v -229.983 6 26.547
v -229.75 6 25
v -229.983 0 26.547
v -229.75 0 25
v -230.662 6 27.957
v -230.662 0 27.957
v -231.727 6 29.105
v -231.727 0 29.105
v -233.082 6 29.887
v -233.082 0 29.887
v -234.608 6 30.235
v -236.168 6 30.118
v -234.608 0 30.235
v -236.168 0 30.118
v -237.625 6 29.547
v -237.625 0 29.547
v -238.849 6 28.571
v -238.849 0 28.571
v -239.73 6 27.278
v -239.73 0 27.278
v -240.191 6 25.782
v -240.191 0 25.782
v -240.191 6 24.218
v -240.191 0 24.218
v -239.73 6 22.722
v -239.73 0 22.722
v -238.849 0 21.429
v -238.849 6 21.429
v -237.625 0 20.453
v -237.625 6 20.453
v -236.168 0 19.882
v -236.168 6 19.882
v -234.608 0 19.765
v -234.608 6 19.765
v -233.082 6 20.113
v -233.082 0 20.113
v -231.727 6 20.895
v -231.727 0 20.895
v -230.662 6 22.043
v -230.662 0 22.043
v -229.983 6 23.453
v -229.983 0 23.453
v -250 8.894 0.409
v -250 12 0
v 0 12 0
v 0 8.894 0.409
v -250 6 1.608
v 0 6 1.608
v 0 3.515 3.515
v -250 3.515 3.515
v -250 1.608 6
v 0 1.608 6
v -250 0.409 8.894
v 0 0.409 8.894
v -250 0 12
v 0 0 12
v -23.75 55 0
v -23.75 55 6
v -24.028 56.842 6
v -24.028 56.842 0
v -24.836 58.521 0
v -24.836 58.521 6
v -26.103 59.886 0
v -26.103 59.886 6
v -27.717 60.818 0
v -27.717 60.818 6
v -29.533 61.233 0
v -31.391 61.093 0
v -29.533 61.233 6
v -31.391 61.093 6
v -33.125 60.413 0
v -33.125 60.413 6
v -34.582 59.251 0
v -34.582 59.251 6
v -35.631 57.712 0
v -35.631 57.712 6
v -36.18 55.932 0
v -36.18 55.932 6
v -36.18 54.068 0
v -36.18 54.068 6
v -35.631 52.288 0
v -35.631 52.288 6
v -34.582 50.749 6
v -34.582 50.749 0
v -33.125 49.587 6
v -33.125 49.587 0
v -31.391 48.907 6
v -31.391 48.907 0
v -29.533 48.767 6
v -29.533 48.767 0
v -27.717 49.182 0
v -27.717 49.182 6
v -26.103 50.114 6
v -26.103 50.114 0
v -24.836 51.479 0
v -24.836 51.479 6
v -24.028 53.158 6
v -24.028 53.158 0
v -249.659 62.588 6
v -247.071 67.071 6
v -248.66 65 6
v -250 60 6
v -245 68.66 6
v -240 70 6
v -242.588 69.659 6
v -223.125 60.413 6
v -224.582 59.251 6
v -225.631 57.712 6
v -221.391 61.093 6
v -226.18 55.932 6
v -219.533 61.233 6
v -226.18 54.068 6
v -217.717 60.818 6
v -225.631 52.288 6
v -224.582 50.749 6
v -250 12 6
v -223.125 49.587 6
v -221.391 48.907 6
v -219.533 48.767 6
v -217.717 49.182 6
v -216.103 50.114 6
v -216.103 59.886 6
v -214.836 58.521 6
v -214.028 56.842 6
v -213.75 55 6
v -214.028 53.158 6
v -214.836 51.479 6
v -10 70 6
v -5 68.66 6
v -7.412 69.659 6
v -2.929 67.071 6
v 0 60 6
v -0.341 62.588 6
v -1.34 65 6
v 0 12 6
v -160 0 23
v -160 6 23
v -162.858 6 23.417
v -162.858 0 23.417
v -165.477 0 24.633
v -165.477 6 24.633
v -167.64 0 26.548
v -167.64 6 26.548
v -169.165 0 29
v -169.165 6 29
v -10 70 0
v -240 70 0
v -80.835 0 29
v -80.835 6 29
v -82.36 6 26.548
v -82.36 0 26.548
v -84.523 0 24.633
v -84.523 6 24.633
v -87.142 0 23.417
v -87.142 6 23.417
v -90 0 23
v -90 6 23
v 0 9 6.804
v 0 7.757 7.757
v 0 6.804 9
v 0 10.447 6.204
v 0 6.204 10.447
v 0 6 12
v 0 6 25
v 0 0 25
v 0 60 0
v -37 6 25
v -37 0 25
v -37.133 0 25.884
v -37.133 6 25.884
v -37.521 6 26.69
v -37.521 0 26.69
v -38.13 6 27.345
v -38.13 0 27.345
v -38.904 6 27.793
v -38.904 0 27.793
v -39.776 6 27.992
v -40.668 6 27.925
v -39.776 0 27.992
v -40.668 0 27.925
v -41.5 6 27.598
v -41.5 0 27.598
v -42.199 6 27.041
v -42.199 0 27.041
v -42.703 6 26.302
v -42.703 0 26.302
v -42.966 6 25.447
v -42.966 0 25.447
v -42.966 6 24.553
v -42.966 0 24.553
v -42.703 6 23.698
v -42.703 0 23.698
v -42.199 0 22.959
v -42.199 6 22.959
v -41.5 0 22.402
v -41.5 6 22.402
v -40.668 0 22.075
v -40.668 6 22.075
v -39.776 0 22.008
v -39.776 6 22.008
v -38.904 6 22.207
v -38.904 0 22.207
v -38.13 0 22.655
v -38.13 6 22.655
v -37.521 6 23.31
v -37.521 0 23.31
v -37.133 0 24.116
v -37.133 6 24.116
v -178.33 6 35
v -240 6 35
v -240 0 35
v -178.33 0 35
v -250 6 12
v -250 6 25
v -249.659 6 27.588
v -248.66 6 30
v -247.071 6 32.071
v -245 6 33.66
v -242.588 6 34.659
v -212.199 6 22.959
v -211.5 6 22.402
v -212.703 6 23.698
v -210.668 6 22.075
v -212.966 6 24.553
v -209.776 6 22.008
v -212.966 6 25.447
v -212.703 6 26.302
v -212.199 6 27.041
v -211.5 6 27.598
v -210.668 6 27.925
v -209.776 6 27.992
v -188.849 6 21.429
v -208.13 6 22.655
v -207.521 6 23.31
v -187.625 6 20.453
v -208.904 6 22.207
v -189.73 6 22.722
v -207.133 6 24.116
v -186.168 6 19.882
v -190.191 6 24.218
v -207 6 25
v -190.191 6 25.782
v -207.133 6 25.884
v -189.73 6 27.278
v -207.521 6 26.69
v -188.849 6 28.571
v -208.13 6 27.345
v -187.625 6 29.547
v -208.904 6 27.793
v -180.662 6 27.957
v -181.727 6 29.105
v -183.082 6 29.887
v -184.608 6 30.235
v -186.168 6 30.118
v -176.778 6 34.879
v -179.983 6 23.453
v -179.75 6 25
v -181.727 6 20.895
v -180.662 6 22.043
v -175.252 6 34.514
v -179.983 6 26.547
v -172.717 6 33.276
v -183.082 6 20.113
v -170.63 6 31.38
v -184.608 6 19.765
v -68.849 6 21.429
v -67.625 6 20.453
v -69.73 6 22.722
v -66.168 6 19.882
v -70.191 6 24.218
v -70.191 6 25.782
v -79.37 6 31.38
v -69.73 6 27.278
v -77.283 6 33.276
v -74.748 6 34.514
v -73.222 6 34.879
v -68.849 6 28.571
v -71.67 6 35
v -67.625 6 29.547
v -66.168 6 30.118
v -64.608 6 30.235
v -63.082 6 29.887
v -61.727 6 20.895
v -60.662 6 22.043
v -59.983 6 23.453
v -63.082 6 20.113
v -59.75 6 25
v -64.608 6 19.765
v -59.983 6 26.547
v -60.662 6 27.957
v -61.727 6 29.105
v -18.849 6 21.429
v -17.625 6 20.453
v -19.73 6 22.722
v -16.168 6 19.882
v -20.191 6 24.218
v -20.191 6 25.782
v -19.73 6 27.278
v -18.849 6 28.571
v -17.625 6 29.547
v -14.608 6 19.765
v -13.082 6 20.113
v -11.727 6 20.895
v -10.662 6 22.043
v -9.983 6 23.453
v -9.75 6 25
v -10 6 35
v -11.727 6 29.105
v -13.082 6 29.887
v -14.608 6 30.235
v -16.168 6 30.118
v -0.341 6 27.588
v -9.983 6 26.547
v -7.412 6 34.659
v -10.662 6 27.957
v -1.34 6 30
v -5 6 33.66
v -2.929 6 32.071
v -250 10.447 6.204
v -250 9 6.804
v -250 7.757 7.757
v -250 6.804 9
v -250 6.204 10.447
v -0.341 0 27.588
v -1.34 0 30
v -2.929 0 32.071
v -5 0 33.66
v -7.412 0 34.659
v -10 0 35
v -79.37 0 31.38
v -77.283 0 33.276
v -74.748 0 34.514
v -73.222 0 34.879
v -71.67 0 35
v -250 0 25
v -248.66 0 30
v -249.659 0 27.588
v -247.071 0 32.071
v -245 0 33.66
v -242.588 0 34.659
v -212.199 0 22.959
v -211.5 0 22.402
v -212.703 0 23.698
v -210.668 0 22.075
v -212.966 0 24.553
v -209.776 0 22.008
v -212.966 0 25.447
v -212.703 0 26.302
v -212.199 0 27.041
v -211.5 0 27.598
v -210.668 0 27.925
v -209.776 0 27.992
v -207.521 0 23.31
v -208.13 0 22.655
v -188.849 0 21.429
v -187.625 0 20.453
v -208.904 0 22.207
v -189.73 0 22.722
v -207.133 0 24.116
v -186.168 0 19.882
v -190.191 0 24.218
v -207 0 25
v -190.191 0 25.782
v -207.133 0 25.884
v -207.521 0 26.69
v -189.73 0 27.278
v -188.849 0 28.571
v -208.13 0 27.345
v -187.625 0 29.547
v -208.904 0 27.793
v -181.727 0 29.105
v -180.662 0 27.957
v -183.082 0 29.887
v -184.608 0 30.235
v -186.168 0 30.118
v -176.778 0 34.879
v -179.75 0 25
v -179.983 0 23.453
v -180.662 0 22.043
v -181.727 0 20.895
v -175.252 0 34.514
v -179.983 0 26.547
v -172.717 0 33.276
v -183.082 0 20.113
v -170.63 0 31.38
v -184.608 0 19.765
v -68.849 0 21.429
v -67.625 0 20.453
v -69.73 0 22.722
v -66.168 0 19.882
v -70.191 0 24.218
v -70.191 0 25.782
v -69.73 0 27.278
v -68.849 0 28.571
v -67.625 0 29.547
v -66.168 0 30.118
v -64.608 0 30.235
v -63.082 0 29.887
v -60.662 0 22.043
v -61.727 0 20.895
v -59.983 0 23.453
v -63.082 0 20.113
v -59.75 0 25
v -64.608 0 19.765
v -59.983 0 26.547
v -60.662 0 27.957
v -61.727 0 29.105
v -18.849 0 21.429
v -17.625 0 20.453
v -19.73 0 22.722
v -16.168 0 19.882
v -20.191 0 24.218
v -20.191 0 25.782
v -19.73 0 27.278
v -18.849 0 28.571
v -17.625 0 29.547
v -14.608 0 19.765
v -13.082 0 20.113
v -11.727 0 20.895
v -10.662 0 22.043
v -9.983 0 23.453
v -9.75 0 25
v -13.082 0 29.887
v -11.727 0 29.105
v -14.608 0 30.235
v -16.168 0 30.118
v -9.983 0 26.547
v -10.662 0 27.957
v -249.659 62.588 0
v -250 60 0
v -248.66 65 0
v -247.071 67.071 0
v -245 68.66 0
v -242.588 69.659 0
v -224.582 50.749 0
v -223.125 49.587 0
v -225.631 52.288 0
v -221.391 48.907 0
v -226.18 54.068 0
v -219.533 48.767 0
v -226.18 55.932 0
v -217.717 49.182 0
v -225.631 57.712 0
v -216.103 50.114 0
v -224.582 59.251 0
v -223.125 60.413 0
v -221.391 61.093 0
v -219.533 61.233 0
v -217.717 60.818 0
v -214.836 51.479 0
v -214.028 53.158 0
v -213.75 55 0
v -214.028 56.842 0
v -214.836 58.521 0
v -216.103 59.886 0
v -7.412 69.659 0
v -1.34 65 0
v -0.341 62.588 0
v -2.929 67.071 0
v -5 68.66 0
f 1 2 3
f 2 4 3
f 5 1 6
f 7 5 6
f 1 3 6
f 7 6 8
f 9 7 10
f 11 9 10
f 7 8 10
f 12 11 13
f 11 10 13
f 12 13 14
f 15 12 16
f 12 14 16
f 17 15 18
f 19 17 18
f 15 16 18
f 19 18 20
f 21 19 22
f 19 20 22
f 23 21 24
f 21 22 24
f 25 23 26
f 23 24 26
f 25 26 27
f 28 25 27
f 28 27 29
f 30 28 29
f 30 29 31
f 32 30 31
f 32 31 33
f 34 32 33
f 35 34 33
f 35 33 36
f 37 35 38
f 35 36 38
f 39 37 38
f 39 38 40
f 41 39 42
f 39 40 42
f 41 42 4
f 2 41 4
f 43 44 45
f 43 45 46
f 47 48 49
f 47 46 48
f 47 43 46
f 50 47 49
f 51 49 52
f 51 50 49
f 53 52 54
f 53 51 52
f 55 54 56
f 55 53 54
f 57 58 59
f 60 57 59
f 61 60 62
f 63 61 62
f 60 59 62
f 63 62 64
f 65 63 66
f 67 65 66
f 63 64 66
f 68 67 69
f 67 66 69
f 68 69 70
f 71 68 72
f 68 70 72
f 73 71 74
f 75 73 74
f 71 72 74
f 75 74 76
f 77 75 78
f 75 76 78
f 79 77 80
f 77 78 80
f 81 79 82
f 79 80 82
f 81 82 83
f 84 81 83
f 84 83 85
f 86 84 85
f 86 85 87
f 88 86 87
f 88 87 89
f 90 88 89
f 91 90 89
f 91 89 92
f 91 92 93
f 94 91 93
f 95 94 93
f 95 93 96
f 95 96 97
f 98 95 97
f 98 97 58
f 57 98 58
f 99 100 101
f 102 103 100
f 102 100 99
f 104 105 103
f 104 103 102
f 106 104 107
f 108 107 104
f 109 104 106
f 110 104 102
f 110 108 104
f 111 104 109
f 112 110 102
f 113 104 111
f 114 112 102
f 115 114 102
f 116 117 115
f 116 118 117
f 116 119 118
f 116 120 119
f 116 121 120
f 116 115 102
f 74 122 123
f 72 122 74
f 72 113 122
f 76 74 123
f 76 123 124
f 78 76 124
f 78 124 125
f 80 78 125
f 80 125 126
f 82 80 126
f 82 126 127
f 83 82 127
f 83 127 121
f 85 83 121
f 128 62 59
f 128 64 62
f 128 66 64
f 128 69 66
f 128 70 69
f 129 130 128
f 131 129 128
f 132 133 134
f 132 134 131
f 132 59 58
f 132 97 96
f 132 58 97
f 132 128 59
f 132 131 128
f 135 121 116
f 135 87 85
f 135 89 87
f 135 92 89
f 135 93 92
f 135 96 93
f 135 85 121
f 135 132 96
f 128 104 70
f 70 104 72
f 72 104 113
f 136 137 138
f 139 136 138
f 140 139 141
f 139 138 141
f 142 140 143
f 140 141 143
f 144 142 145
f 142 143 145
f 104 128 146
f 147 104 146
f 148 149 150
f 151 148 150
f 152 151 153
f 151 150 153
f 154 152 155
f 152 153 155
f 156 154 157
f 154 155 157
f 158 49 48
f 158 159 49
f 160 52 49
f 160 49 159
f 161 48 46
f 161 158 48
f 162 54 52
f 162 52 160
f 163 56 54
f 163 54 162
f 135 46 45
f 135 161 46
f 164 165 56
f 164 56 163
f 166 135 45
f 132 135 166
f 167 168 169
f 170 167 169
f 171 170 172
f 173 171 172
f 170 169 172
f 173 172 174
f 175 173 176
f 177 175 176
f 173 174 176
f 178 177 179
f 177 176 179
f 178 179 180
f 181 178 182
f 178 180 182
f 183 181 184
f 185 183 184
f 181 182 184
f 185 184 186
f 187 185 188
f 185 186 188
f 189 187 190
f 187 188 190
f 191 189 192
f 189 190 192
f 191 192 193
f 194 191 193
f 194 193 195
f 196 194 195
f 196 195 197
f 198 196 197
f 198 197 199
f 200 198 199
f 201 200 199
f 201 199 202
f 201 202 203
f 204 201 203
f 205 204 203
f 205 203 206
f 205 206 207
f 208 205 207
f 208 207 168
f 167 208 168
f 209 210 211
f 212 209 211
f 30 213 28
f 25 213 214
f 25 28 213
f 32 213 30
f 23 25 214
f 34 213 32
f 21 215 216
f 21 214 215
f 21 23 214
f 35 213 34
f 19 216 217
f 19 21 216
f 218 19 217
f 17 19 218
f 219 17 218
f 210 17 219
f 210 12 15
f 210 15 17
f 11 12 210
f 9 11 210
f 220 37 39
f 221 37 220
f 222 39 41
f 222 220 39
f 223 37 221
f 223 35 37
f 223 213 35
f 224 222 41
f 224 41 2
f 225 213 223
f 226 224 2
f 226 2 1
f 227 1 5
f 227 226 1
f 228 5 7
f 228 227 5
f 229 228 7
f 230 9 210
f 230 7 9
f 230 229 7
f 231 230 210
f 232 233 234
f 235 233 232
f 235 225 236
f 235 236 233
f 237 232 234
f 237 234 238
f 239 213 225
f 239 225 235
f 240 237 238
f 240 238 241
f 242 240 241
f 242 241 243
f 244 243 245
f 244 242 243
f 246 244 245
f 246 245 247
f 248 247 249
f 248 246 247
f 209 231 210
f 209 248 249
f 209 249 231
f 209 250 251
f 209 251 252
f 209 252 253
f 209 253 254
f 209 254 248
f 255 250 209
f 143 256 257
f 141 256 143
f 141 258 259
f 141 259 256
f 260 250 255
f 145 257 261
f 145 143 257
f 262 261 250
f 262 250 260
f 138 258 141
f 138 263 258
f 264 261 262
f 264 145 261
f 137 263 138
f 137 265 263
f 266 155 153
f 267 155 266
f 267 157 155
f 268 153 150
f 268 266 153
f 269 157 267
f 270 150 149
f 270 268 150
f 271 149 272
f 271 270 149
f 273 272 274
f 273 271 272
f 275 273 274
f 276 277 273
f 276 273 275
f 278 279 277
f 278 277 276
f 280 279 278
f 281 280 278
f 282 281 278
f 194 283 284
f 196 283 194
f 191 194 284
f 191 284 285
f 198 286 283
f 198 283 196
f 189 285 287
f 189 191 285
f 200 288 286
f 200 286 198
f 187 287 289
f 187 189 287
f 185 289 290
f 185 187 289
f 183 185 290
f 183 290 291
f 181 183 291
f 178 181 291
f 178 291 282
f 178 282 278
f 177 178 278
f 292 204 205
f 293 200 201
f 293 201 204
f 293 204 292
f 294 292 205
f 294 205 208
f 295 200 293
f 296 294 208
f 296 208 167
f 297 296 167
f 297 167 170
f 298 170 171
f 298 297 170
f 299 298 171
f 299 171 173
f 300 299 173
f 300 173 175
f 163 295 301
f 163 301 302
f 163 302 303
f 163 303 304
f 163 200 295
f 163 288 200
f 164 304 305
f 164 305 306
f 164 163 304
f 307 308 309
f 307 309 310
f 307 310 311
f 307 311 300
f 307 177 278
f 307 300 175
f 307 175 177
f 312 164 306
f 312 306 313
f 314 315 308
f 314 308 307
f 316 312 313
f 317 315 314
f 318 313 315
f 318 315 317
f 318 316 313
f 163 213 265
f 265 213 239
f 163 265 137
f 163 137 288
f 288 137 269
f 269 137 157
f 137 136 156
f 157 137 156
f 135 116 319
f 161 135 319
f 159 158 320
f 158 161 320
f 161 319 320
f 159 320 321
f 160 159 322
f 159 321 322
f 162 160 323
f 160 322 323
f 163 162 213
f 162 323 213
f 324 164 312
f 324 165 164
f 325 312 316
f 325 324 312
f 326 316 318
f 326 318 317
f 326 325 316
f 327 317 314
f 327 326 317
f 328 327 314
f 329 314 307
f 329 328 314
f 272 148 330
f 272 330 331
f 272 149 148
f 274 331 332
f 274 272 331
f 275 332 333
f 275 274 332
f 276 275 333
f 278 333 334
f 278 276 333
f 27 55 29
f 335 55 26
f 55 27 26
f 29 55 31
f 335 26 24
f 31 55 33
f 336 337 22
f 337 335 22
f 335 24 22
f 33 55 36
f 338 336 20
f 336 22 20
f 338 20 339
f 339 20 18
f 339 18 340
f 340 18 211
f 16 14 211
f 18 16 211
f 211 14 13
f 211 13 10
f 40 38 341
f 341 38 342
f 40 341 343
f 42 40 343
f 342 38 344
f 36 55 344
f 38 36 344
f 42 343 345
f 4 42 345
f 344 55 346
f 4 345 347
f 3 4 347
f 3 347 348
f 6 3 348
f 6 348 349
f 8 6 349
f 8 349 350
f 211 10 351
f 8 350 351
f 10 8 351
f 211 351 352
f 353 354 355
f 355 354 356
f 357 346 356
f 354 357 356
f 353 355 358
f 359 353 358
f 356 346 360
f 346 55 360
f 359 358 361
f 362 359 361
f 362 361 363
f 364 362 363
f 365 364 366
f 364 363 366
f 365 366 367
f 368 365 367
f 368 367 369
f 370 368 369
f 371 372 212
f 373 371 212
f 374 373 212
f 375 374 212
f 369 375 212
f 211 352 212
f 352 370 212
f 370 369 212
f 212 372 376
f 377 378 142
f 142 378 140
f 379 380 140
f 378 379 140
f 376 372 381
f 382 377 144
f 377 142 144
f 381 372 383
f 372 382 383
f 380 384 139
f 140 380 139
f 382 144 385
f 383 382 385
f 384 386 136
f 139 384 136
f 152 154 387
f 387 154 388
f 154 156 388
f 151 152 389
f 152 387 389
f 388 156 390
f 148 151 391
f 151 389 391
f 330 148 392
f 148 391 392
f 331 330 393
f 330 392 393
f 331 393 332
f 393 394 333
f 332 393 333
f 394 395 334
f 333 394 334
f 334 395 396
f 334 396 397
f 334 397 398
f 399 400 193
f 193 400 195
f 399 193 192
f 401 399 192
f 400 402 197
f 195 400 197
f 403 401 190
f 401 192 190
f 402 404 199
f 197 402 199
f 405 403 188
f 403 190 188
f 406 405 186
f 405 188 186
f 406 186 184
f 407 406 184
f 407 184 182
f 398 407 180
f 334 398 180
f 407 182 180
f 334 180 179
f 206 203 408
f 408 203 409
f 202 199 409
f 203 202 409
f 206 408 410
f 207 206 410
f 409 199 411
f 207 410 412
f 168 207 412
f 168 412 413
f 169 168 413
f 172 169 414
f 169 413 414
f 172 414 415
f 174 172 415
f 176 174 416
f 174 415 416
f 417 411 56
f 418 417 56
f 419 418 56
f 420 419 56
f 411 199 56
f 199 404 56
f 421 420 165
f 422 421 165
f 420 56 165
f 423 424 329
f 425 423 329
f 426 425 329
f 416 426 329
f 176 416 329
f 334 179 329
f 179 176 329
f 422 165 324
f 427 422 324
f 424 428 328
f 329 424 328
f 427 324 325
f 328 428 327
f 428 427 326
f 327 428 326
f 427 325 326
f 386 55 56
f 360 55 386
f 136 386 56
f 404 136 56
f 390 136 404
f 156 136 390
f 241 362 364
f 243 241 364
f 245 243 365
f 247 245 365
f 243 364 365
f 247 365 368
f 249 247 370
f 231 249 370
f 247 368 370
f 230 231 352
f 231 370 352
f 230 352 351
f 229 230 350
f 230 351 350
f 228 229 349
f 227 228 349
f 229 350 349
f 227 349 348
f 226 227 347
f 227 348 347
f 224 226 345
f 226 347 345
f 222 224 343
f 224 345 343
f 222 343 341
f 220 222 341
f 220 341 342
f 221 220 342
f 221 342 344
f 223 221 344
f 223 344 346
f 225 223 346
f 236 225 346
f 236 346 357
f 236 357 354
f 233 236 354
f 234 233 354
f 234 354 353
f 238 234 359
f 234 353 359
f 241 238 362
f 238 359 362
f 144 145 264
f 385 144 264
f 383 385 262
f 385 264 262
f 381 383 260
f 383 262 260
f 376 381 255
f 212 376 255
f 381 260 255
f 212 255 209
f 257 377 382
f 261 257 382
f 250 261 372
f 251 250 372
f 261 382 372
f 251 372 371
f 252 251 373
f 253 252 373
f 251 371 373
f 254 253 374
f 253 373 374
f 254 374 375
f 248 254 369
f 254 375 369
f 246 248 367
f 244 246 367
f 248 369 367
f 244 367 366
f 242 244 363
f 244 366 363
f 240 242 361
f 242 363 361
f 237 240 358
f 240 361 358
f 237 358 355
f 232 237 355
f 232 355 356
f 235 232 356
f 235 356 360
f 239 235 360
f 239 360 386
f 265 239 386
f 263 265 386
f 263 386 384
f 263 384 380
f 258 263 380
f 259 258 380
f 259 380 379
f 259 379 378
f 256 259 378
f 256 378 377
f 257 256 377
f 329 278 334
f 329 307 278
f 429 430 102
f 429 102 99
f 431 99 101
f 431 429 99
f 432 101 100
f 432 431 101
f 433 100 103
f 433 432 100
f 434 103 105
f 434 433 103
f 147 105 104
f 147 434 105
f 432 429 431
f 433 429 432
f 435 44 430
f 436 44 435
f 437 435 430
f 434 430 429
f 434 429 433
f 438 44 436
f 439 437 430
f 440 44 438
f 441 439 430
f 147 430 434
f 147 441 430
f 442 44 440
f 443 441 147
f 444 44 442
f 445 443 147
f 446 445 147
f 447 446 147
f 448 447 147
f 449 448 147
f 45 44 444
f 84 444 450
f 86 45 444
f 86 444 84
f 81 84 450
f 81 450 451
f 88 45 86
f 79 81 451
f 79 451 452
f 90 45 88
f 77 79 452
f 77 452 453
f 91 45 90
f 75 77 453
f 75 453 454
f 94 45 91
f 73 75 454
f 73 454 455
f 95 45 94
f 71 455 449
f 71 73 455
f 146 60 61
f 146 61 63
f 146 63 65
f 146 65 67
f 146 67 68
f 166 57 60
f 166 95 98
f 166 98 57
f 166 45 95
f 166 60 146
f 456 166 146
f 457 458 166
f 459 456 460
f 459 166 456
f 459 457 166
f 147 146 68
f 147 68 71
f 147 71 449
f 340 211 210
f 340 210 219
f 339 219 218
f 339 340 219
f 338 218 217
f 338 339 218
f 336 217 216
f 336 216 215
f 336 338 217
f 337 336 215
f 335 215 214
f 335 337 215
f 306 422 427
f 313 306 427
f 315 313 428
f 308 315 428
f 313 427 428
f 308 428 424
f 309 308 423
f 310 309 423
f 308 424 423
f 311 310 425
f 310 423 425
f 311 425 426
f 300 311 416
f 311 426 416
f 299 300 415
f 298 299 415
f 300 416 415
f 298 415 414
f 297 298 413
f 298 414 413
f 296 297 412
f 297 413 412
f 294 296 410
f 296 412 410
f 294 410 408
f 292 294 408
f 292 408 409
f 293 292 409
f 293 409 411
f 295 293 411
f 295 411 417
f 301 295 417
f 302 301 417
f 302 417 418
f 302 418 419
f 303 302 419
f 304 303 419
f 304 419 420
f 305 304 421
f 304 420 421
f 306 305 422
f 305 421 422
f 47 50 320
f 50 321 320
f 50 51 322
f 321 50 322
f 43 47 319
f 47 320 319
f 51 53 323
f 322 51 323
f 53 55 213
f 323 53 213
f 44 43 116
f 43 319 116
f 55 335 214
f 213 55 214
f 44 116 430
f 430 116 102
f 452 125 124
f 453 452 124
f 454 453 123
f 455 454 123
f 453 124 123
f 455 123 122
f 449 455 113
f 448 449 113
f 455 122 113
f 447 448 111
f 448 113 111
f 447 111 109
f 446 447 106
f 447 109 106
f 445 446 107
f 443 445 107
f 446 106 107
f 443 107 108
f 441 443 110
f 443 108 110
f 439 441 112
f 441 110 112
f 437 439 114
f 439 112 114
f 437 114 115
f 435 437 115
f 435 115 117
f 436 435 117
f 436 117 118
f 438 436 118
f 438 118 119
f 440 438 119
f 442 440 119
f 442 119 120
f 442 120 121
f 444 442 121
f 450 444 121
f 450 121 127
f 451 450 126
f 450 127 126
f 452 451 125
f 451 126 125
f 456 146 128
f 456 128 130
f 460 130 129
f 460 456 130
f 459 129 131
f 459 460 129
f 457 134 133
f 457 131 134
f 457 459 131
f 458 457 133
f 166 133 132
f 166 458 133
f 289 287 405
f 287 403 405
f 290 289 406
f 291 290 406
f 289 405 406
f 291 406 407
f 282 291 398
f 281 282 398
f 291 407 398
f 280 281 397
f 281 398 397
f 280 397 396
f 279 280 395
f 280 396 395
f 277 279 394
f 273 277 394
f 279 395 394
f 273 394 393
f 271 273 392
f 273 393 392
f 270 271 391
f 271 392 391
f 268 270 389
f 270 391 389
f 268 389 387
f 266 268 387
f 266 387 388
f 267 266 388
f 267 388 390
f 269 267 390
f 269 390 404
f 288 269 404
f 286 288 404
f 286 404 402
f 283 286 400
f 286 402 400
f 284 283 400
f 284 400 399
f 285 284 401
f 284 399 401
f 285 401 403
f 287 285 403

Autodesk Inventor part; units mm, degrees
ref_plane "YZ Plane" through (0, 0, 0) normal (1, 0, 0) x (0, 1, 0)
ref_plane "XZ Plane" through (0, 0, 0) normal (0, 1, 0) x (-1, 0, 0)
ref_plane "XY Plane" through (0, 0, 0) normal (0, 0, 1) x (1, 0, 0)
sketch "Эскиз1" plane through (0, 0, 0) normal (1, 0, 0) x (0, 1, 0)
  line L0 (-14, 0) -> (84, 0) projected
  line L1 (0, -7) -> (0, 42) projected
  line L2 (0, 35) -> (0, 0)
  line L3 (0, 0) -> (70, 0)
  line L4 (70, 6) -> (6, 6)
  line L5 (6, 6) -> (6, 35)
  line L6 (6, 35) -> (0, 35)
  line L7 (70, 6) -> (70, 0)
  dimension "d50" = 6
  dimension "d51" = 6
  dimension "d52" = 70
  dimension "d53" = 35
extrude "Выдавливание1" add sketch "Эскиз1" against normal blind 250
fillet "Сопряжение2" radius 6 1 edges at (-125, 6, 6)
fillet "Сопряжение3" radius 12 1 edges at (-125, 0, 0)
sketch "Эскиз5" plane through (-250, 0, 35) normal (0, -1, 0) x (1, 0, 0)
  line L0 (250, 0) -> (250, -23) construction
  line L1 (0, -23) -> (0, 0) construction
  line L2 (250, 0) -> (0, 0) construction
  line L3 (0, -10) -> (250, -10) construction
  circle A0 centre (15, -10) radius 5.25
  circle A1 centre (65, -10) radius 5.25
  circle A2 centre (235, -10) radius 5.25
  circle A3 centre (185, -10) radius 5.25
  point P0 (250, -35)
  dimension "d56" = 10
  dimension "d57" = 15
  dimension "d58" = 50
  dimension "d59" = 220
  dimension "d60" = 50
  dimension "d61" = 10.5
extrude "Выдавливание3" cut sketch "Эскиз5" against normal blind 10
fillet "Сопряжение4" radius 10 2 edges at (0, 3, 35) (-250, 3, 35)
sketch "Эскиз6" plane through (-250, 0, 12) normal (0, -1, 0) x (1, 0, 0)
  circle A0 centre (65, 13) radius 5.25 construction
  circle A1 centre (185, 13) radius 5.25 construction
  line L0 (240, 23) -> (10, 23) construction
  line L1 (80, 23) -> (80, 11)
  line L2 (80, 11) -> (170, 11)
  line L3 (170, 11) -> (170, 23)
  line L4 (80, 23) -> (170, 23)
  point P0 (250, -12)
  dimension "d65" = 15
  dimension "d66" = 15
  dimension "d67" = 12
extrude "Выдавливание4" cut sketch "Эскиз6" against normal blind 10
fillet "Сопряжение5" radius 10 4 edges at (-170, 3, 23) (-80, 3, 23) (-170, 3, 35) (-80, 3, 35)
fillet "Сопряжение6" radius 10 2 edges at (0, 70, 3) (-250, 70, 3)
sketch "Эскиз7" plane through (-250, 12, 6) normal (0, 0, 1) x (1, 0, 0)
  line L0 (240, -12) -> (178.3303, -12) construction
  circle A0 centre (220, 43) radius 6.25
  circle A1 centre (30, 43) radius 6.25
  line L1 (250, 48) -> (250, 0) construction
  line L2 (0, 0) -> (0, 48) construction
  point P0 (250, -12)
  dimension "d72" = 55
  dimension "d73" = 12.5
  dimension "d74" = 30
  dimension "d75" = 30
  dimension "d76" = 55
extrude "Выдавливание5" cut sketch "Эскиз7" against normal blind 10
sketch "Эскиз8" plane through (-250, 0, 12) normal (0, -1, 0) x (1, 0, 0)
  circle A0 centre (15, 13) radius 5.25 construction
  circle A1 centre (65, 13) radius 5.25 construction
  circle A2 centre (235, 13) radius 5.25 construction
  line L0 (15, 13) -> (65, 13) construction
  line L1 (185, 13) -> (235, 13) construction
  circle A3 centre (40, 13) radius 3
  circle A4 centre (210, 13) radius 3
  point P0 (250, -12)
  dimension "d79" = 25
  dimension "d80" = 6
  dimension "d81" = 6
  dimension "d82" = 25
extrude "Выдавливание6" cut sketch "Эскиз8" against normal blind 10
properties part number "ОПОРА_05"
